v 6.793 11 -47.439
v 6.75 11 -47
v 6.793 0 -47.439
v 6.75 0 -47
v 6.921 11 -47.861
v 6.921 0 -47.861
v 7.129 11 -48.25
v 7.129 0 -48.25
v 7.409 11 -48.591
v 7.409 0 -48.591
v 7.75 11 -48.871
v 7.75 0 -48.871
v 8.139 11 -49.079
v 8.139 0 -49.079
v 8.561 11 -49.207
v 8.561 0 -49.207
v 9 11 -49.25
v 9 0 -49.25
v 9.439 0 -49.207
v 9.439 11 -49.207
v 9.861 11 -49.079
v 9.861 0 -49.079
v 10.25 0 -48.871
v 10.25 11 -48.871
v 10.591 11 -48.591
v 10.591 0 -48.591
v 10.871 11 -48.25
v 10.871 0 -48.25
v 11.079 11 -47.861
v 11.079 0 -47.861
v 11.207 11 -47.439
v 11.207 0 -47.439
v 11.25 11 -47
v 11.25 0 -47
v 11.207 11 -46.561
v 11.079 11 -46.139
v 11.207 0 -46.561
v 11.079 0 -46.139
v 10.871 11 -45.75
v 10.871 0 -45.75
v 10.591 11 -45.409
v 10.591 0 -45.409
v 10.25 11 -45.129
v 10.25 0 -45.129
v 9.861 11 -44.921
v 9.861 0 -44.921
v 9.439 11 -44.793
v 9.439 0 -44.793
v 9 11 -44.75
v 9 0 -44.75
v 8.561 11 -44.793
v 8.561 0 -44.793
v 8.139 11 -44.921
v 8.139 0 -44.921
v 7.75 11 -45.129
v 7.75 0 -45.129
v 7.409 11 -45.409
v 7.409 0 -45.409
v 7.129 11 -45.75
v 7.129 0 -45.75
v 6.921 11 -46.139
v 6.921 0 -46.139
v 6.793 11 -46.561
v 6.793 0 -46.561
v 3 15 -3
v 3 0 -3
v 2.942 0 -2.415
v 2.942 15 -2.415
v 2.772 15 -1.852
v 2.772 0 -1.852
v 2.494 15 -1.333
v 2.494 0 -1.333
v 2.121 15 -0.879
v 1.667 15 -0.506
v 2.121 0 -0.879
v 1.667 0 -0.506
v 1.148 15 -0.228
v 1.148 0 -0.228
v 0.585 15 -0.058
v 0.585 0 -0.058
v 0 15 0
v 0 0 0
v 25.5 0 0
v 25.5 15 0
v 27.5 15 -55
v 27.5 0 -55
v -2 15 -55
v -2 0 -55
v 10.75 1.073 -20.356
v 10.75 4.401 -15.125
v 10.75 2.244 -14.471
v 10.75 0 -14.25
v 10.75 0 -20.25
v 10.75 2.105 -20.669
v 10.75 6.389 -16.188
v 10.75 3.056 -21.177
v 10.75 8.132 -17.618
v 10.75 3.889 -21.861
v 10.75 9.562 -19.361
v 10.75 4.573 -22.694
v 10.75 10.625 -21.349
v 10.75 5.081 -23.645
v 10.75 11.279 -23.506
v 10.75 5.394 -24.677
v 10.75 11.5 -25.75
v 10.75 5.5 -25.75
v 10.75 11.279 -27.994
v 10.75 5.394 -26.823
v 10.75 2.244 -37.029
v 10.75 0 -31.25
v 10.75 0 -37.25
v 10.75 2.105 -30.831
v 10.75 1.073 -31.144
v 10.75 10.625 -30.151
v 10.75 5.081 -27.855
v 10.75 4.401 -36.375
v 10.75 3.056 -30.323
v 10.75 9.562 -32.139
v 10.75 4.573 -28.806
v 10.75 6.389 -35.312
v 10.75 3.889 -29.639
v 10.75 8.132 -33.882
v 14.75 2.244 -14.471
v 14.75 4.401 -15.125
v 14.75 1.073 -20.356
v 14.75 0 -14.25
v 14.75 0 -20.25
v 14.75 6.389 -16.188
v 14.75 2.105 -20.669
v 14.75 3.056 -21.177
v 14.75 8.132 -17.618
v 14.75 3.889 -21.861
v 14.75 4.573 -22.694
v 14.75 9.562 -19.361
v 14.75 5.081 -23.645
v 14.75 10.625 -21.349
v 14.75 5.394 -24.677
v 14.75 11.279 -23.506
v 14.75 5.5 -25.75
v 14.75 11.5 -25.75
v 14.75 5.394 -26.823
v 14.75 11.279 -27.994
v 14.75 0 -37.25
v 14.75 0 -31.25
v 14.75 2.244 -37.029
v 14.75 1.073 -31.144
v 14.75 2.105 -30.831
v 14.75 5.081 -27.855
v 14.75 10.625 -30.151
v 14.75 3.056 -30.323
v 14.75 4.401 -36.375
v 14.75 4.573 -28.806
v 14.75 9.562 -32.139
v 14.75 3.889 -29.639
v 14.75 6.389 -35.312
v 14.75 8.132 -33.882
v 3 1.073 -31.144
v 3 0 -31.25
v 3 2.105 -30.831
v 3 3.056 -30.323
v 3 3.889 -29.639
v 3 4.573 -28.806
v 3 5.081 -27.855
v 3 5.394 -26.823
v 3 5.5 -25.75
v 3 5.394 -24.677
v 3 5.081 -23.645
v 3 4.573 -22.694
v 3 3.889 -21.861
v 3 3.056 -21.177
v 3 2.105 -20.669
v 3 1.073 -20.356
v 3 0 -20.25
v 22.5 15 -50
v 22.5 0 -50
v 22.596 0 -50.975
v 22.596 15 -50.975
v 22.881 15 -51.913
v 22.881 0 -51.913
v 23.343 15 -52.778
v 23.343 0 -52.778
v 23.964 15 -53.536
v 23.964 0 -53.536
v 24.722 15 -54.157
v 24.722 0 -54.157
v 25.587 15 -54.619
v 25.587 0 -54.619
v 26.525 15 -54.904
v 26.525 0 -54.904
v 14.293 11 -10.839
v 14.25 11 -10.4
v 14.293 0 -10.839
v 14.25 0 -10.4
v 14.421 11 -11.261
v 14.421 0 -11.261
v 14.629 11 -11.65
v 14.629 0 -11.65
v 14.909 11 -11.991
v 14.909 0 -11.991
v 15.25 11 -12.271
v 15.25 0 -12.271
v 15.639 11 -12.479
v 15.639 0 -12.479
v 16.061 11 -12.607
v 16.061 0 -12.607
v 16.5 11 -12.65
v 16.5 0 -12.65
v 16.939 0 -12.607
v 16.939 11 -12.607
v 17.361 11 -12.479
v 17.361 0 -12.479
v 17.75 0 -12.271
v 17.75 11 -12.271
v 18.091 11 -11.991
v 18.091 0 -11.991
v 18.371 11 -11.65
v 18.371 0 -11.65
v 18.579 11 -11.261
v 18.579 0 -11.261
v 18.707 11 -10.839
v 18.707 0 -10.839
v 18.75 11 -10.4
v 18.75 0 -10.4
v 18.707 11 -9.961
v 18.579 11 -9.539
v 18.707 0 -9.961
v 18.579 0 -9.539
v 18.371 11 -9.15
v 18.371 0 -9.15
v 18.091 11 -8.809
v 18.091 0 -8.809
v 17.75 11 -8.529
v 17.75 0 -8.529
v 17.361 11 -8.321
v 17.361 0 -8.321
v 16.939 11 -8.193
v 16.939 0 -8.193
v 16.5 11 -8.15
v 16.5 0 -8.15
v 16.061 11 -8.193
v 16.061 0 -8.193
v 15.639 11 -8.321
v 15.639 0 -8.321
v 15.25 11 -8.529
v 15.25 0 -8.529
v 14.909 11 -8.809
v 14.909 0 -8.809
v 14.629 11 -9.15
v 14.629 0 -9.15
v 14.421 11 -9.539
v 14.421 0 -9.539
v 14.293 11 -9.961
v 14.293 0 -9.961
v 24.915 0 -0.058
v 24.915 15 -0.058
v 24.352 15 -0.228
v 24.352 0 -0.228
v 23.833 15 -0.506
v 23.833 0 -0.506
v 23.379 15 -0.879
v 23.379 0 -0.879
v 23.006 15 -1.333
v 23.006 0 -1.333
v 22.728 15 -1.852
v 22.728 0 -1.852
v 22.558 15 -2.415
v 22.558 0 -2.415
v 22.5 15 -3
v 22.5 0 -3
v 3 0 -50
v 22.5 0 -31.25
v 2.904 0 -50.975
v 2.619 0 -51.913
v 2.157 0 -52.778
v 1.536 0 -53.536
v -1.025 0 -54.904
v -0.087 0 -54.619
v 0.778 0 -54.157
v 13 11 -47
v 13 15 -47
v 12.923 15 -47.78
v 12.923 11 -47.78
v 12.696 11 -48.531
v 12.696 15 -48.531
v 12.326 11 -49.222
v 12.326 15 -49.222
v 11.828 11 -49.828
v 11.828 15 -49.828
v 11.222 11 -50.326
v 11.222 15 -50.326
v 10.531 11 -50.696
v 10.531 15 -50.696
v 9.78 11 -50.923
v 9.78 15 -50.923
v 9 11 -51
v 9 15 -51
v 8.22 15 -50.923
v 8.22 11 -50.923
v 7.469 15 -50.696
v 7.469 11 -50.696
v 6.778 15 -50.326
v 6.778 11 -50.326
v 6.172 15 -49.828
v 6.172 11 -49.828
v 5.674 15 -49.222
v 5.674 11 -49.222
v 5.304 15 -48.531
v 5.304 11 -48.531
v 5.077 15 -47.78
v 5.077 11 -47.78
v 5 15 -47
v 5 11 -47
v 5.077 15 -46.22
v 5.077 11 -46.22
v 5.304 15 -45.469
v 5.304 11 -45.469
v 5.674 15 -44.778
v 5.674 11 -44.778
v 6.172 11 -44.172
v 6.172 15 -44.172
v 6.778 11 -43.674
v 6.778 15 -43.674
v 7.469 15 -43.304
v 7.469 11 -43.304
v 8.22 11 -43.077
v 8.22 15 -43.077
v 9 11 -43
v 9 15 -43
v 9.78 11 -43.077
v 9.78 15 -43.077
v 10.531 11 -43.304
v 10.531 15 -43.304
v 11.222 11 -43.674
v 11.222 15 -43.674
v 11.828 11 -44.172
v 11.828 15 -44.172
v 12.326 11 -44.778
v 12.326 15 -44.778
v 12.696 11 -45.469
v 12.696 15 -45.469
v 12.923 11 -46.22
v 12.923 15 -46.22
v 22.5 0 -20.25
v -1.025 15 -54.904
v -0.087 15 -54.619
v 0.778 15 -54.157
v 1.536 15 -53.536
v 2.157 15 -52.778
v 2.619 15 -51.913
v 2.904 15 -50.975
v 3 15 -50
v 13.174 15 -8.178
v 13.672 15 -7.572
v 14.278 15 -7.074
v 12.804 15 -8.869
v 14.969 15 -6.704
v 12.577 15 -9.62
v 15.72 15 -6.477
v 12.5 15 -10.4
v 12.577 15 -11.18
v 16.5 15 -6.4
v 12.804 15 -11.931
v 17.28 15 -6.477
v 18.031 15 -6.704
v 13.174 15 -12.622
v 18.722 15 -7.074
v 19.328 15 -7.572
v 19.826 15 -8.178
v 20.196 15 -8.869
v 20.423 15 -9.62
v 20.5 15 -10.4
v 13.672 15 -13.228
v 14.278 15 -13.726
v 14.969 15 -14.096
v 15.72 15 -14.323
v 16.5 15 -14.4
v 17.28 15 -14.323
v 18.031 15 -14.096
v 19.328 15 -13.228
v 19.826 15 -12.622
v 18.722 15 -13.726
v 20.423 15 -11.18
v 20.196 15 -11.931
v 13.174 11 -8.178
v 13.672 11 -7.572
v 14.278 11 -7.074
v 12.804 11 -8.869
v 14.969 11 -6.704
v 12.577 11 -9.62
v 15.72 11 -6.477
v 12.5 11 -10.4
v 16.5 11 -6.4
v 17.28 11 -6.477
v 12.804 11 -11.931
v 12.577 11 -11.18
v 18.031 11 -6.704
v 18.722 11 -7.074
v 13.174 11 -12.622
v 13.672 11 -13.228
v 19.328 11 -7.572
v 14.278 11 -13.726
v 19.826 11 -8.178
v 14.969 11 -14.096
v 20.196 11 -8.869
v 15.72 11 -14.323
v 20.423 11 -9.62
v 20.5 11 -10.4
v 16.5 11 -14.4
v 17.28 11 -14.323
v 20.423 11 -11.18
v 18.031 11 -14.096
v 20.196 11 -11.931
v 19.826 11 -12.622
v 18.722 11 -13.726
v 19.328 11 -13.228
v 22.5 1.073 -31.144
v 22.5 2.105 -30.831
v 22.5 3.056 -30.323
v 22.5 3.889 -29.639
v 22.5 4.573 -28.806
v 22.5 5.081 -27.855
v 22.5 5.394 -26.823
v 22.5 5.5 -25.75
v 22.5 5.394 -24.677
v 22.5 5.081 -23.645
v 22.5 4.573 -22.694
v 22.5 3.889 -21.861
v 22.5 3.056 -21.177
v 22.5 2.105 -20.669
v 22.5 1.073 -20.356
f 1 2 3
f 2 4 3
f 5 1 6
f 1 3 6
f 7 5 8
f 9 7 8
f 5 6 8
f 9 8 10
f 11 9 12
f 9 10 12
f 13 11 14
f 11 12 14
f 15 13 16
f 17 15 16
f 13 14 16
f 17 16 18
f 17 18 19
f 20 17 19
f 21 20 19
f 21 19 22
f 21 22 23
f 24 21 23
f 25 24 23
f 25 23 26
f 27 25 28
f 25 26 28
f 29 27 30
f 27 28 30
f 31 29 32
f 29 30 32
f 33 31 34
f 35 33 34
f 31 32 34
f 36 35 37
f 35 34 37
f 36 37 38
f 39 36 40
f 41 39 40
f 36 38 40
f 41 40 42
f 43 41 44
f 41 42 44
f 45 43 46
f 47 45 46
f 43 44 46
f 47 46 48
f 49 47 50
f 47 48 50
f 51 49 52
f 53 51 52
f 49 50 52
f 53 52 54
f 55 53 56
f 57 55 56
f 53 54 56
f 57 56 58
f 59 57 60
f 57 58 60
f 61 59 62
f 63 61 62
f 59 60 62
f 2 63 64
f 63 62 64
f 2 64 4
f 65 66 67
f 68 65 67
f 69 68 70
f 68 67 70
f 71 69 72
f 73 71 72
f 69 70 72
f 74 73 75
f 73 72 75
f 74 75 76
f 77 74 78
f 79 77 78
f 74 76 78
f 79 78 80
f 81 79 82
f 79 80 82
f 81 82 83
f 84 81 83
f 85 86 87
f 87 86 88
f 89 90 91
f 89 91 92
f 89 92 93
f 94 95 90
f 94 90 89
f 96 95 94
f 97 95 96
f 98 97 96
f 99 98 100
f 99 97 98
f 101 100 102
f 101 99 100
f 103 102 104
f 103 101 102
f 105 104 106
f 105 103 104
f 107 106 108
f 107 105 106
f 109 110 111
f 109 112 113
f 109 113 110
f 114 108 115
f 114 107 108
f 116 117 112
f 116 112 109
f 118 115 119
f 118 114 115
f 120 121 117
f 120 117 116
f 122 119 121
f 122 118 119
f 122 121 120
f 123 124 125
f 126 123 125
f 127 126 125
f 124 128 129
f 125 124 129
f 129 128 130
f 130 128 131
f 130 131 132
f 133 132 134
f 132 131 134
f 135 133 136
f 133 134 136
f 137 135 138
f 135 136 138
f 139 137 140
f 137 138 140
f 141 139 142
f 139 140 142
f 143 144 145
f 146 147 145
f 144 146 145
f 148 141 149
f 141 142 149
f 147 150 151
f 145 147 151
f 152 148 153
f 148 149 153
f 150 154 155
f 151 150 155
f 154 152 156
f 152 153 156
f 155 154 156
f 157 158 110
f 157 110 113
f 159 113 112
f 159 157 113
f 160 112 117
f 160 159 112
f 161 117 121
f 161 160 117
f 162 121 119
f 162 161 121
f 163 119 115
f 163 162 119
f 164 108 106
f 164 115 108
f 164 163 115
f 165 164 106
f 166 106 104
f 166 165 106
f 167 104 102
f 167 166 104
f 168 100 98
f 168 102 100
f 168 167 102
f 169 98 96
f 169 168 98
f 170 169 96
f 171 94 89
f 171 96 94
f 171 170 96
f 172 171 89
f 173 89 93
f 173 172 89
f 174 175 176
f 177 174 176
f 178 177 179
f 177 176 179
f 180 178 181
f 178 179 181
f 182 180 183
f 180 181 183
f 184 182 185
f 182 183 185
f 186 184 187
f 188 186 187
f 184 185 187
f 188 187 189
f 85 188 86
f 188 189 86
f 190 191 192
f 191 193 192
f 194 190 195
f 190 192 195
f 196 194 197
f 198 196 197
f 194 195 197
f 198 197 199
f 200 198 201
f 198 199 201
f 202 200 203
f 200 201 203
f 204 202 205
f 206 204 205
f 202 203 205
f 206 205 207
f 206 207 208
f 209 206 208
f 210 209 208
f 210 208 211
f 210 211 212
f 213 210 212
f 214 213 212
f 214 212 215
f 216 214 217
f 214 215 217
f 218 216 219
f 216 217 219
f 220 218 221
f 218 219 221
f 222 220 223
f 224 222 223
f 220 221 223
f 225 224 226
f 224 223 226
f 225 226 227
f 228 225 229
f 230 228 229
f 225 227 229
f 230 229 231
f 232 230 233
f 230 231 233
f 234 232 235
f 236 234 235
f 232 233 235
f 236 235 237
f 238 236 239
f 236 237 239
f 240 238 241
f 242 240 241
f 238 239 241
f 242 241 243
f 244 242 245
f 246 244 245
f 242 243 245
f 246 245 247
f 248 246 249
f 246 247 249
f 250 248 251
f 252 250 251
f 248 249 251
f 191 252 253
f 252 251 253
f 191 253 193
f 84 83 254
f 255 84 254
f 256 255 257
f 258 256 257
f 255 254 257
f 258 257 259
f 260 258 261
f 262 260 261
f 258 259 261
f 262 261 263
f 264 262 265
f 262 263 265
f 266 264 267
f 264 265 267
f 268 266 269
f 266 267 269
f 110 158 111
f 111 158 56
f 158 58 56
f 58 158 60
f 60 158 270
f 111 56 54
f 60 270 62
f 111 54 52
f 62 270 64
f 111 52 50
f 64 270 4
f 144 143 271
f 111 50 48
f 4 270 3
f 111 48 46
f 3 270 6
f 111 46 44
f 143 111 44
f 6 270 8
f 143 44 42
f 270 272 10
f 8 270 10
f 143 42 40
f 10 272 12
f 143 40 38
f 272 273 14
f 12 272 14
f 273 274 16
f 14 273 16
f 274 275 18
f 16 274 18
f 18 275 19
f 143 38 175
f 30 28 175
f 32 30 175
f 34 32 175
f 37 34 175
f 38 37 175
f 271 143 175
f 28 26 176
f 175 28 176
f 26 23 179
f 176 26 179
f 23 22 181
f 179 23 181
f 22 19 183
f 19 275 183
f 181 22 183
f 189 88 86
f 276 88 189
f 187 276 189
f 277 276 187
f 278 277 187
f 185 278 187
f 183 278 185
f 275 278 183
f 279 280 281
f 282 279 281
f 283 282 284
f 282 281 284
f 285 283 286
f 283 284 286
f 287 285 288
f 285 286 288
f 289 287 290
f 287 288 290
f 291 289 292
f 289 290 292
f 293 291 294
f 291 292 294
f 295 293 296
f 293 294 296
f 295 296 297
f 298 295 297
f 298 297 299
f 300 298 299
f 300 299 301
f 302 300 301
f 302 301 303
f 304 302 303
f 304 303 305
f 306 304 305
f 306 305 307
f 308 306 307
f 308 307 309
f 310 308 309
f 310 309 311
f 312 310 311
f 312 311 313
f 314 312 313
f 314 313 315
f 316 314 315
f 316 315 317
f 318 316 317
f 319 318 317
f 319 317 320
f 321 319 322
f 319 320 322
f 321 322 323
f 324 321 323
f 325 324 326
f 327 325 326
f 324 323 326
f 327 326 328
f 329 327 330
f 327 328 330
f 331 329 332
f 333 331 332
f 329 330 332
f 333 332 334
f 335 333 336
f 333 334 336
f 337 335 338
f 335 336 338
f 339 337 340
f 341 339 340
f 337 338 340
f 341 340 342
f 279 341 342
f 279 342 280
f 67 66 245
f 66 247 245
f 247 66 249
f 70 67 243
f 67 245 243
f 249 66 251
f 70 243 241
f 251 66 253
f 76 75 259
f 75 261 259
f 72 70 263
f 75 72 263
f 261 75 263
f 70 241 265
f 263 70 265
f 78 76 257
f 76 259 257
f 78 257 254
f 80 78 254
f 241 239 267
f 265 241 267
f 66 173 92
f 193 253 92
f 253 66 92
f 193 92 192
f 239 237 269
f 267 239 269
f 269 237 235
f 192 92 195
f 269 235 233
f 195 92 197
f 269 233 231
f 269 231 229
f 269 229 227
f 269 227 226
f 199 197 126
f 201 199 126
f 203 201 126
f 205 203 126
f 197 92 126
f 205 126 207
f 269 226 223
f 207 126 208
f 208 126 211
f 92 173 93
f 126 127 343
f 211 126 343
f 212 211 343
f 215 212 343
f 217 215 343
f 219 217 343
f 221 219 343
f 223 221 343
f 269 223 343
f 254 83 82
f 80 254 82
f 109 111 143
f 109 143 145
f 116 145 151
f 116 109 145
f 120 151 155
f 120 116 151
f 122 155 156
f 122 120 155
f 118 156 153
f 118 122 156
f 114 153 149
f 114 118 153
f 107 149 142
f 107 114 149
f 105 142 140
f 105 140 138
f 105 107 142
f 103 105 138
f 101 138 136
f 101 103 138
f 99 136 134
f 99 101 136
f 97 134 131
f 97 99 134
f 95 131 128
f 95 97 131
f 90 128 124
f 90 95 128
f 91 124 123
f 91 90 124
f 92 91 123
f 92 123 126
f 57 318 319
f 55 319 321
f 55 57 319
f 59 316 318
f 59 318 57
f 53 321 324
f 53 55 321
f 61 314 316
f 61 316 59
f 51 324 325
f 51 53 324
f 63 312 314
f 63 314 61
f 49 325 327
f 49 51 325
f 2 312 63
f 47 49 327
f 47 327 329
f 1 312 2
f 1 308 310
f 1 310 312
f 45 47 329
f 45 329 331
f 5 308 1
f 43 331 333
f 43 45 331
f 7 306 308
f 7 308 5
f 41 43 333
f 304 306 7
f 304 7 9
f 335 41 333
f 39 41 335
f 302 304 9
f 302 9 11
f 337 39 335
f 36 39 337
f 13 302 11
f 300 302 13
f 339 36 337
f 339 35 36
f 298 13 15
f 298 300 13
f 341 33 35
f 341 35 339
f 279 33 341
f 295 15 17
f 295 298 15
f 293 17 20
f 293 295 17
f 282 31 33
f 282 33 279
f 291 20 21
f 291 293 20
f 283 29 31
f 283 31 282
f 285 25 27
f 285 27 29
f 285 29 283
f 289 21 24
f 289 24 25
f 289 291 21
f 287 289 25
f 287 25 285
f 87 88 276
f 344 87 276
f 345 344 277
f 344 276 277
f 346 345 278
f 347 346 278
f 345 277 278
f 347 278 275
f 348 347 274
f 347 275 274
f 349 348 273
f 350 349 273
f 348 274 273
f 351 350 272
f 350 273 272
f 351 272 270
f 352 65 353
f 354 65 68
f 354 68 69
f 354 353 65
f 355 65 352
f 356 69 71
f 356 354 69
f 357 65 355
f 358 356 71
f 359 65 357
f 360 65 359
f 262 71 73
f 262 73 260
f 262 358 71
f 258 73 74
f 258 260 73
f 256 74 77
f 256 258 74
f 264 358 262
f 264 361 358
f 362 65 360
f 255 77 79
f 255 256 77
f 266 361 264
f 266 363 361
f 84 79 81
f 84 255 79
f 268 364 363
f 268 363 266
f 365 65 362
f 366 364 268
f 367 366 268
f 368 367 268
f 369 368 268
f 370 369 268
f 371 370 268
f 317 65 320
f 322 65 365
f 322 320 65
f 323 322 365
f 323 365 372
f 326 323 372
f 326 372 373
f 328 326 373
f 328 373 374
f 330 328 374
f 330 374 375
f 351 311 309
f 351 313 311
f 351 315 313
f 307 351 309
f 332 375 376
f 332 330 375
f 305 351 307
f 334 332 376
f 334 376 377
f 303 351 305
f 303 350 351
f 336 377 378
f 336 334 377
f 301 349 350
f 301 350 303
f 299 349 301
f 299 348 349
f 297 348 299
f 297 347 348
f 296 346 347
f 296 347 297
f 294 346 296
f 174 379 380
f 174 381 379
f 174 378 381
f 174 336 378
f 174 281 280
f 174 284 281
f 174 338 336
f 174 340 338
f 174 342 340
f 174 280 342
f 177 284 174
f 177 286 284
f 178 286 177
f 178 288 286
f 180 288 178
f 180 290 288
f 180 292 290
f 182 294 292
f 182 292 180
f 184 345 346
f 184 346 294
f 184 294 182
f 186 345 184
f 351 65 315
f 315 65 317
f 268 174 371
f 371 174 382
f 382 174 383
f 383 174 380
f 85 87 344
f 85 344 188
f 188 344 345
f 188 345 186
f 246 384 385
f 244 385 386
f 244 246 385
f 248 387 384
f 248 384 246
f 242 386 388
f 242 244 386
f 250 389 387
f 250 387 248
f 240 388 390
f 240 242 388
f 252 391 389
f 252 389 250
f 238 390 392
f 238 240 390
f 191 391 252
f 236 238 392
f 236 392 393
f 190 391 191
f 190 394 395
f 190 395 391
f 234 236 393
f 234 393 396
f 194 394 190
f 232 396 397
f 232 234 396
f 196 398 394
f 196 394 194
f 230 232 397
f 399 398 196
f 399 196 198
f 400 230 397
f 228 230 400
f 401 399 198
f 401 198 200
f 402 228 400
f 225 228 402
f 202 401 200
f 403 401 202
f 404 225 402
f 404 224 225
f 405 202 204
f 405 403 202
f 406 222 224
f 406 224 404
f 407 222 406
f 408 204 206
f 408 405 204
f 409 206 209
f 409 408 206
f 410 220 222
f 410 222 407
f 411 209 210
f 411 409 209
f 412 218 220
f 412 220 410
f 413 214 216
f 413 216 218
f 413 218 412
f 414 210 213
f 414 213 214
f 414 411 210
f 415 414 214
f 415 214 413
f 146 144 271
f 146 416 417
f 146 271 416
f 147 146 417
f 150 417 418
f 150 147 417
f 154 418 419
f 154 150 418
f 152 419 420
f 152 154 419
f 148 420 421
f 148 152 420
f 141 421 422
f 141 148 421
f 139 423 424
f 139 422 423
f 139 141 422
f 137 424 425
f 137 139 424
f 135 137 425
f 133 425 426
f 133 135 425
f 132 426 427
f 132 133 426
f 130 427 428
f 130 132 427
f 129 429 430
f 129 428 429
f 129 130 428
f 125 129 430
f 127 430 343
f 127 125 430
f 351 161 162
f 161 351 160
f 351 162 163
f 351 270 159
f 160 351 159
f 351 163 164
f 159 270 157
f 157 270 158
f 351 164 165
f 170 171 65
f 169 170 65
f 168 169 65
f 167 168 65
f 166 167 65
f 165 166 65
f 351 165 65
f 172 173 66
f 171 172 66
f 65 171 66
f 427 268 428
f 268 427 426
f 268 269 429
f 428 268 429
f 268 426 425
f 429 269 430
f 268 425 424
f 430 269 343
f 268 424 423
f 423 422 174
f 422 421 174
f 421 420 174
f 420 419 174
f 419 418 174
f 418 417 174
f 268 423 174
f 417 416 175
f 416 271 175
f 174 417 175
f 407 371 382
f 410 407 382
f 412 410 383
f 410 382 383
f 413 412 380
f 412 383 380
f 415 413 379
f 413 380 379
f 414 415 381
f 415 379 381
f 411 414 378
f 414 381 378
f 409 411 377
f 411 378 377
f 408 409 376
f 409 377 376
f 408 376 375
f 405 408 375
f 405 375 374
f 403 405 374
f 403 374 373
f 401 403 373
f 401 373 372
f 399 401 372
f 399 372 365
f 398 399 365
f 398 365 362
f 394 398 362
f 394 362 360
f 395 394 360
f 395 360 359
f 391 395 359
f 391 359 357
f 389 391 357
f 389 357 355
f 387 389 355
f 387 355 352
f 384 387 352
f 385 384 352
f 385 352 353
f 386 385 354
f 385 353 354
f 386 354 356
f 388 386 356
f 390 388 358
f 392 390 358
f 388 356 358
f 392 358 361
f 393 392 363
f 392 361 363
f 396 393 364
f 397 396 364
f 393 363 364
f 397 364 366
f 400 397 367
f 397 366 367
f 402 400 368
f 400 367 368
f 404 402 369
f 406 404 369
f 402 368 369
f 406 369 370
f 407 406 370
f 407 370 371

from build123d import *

# Parameters (mm, degrees)
CORPO_DEPTH                            = 15
ENCAIXE_FLANGE_11_PASSANTE_DEPTH       = 59.88601277
ENCAIXE_FLANGE_11_PASSANTE_DEPTH_BACK  = 59.88601277
ESBO_O3_R                              = 5.5
ENCAIXE_FLANGE_23X4_DEPTH              = 2
ENCAIXE_FLANGE_23X4_DEPTH_BACK         = 2
ESBO_O4_R                              = 11.5
REBAIXO_M4_FUROS_DE_FIXA_O_D           = 4.5
REBAIXO_M4_FUROS_DE_FIXA_O_CBORE_D     = 8
REBAIXO_M4_FUROS_DE_FIXA_O_CBORE_DEPTH = 4


with BuildPart() as part:
    # Esboço1 → Corpo (new body)
    with BuildSketch(Plane(origin=(0, 0, 0), x_dir=(1, 0, 0), z_dir=(0, 1, 0))):
        with BuildLine():
            Line((3, 50), (3, 3))
            ThreePointArc((3, 3), (2.121320344, 0.878679656), (0, 0))
            Line((0, 0), (25.5, 0))
            ThreePointArc((25.5, 0), (23.378679656, 0.878679656), (22.5, 3))
            Line((22.5, 3), (22.5, 50))
            ThreePointArc((22.5, 50), (23.964466094, 53.535533906), (27.5, 55))
            Line((27.5, 55), (-2, 55))
            ThreePointArc((-2, 55), (1.535533906, 53.535533906), (3, 50))
        make_face()
    extrude(amount=CORPO_DEPTH)

    # Esboço3 → Encaixe Flange - Ø11 Passante (cut, two sides: drawn at the far end of the back side and taken through both)
    with BuildSketch(Plane(origin=(12.75, 0, 0), x_dir=(0, 0, -1), z_dir=(1, 0, 0)).offset(-ENCAIXE_FLANGE_11_PASSANTE_DEPTH_BACK)):
        with Locations((25.75, 0)):
            Circle(ESBO_O3_R)
    extrude(amount=ENCAIXE_FLANGE_11_PASSANTE_DEPTH + ENCAIXE_FLANGE_11_PASSANTE_DEPTH_BACK, mode=Mode.SUBTRACT)

    # Esboço4 → Encaixe Flange - Ø23x4 (cut, two sides: drawn at the far end of the back side and taken through both)
    with BuildSketch(Plane(origin=(12.75, 0, 0), x_dir=(0, 0, -1), z_dir=(1, 0, 0)).offset(-ENCAIXE_FLANGE_23X4_DEPTH_BACK)):
        with Locations((25.75, 0)):
            Circle(ESBO_O4_R)
    extrude(amount=ENCAIXE_FLANGE_23X4_DEPTH + ENCAIXE_FLANGE_23X4_DEPTH_BACK, mode=Mode.SUBTRACT)

    # Rebaixo M4 - Furos de Fixação (through all)
    with Locations(Plane(origin=(0, 15, 0), x_dir=(1, 0, 0), z_dir=(0, 1, 0))):
        with Locations((16.5, 10.4), (9, 47)):
            CounterBoreHole(REBAIXO_M4_FUROS_DE_FIXA_O_D / 2, REBAIXO_M4_FUROS_DE_FIXA_O_CBORE_D / 2, REBAIXO_M4_FUROS_DE_FIXA_O_CBORE_DEPTH)


solid = part.part
